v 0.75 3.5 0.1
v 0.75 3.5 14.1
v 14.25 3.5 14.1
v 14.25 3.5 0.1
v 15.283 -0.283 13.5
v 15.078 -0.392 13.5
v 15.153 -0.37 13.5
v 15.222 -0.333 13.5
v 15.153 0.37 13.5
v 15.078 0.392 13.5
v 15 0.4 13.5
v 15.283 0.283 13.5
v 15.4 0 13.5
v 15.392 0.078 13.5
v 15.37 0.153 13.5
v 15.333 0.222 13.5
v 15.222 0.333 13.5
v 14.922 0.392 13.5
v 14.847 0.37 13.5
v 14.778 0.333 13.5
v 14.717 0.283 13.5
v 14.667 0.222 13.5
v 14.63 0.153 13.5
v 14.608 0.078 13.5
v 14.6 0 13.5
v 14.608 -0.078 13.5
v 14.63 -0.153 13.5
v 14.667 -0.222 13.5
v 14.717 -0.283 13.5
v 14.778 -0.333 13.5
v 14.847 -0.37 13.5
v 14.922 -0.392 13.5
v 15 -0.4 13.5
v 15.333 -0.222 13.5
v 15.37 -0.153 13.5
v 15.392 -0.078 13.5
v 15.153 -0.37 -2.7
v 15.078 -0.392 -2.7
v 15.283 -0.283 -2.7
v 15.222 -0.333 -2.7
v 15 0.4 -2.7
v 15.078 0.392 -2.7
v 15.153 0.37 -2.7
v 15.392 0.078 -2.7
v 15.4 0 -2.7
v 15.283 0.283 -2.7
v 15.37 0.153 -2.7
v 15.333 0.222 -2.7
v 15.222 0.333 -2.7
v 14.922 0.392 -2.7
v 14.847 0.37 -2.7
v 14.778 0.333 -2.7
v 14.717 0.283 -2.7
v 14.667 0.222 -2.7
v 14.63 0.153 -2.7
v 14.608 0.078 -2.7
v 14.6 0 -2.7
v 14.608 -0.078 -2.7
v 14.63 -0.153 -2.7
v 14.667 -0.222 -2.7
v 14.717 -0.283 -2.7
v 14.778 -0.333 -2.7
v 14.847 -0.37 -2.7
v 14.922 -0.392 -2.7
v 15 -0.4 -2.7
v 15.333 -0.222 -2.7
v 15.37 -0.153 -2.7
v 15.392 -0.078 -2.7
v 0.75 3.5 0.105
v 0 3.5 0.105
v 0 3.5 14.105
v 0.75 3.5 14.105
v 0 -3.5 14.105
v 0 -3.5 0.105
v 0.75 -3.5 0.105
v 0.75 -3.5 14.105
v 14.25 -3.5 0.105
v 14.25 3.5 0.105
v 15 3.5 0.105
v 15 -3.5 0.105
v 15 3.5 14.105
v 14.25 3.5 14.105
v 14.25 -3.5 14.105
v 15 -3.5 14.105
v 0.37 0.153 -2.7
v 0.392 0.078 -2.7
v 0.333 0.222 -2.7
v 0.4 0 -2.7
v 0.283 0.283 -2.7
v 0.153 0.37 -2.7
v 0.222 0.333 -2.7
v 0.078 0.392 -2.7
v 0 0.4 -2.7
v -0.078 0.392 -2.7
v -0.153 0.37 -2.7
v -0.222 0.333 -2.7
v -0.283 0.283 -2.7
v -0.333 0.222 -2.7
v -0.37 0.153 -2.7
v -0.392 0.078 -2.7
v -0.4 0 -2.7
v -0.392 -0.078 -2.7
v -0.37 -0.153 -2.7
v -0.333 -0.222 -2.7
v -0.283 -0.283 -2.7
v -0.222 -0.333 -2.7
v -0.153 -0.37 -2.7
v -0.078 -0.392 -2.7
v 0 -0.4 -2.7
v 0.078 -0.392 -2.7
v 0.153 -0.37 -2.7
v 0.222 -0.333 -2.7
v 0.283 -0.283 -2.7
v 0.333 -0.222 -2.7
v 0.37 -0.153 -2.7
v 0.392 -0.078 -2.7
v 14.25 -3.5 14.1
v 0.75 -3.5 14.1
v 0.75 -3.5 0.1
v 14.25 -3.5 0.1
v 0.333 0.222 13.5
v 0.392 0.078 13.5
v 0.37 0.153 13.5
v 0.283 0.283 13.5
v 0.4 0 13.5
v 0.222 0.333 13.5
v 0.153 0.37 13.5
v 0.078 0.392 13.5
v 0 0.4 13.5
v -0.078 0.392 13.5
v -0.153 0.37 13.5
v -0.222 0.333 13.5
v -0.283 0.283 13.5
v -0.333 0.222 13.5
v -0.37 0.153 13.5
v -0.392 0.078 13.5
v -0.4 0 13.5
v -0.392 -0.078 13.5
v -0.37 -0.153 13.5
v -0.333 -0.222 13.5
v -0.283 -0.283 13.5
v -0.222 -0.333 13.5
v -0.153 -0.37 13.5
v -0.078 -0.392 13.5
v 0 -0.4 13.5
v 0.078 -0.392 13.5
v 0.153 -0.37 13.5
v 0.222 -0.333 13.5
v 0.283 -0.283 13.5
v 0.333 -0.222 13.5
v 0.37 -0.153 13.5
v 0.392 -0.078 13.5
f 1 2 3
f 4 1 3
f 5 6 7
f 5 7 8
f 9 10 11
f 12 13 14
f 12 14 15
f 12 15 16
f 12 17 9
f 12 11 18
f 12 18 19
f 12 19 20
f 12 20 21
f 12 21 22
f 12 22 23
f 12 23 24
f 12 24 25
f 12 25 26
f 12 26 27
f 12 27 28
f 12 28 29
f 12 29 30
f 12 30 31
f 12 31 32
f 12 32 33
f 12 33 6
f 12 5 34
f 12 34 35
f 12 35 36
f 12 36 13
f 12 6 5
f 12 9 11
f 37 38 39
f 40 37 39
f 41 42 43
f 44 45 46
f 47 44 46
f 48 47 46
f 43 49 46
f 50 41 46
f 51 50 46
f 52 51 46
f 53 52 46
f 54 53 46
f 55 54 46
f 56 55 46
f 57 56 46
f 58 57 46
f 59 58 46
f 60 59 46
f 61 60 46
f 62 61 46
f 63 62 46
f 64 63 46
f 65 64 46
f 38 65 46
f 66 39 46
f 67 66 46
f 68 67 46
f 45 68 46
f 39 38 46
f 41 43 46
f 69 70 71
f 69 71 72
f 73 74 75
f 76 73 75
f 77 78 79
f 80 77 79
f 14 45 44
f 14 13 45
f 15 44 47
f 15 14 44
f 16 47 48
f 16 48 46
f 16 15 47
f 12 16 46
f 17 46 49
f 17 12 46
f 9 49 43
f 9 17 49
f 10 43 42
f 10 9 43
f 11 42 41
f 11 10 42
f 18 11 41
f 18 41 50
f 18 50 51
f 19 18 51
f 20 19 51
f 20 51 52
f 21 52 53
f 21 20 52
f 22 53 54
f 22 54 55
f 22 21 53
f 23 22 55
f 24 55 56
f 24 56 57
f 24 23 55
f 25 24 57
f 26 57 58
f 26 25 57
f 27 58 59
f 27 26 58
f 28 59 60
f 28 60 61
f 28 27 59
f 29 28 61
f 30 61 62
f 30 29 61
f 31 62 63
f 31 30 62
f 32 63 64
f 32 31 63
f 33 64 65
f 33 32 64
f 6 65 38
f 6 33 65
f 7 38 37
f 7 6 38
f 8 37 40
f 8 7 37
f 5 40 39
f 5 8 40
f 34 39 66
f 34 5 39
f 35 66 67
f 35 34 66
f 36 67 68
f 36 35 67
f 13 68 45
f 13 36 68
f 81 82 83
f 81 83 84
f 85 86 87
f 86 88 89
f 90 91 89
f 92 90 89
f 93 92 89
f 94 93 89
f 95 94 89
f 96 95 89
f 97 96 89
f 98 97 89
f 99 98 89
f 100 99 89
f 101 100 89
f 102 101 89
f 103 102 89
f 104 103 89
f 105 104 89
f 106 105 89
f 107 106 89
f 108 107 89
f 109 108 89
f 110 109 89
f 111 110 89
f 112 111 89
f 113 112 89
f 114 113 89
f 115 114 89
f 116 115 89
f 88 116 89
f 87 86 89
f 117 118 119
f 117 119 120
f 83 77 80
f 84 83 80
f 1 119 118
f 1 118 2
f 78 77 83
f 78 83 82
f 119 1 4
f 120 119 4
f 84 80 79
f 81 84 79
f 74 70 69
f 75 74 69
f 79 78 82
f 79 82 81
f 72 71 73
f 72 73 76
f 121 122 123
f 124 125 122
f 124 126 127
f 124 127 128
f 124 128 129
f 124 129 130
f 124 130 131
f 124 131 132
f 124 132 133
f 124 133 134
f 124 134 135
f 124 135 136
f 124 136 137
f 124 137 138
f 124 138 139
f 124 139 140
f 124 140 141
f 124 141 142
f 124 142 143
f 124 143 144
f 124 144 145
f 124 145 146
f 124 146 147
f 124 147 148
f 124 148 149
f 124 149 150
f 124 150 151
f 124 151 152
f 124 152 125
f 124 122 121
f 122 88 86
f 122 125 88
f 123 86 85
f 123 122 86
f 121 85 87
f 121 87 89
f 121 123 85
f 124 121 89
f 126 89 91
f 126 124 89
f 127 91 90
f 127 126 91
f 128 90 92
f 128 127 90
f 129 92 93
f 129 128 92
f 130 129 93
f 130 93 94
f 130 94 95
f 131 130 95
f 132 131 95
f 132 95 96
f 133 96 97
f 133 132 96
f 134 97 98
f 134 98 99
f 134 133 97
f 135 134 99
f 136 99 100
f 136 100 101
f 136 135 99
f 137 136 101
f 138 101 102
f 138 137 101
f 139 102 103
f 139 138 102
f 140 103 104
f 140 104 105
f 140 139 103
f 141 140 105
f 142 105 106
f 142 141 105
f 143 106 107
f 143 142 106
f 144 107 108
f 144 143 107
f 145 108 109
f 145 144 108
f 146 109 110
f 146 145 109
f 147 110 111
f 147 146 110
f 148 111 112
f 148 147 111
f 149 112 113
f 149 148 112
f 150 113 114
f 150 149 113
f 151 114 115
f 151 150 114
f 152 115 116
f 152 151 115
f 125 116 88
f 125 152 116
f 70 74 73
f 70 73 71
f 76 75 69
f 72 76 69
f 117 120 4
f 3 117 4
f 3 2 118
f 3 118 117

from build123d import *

# Parameters (mm, degrees)
SKETCH_W          = 13.5
SKETCH_H          = 7
PAD_DEPTH         = 14
SKETCH001_R       = 0.4
PAD001_DEPTH      = 13
PAD001_DEPTH_BACK = 3.2
SKETCH002_W       = 0.75
SKETCH002_H       = 7
PAD002_DEPTH      = 14


with BuildPart() as pad:
    # Sketch → Pad (new body)
    with BuildSketch(Plane.XY.offset(0.1)):
        with Locations((7.5, 0)):
            Rectangle(SKETCH_W, SKETCH_H)
    extrude(amount=PAD_DEPTH)


with BuildPart() as pad001:
    # Sketch001 → Pad001 (new body, two sides)
    with BuildSketch(Plane.XY.offset(0.5)) as pad001_sk:
        Circle(SKETCH001_R)
        with Locations((15, 0)):
            Circle(SKETCH001_R)
    extrude(amount=PAD001_DEPTH)
    extrude(pad001_sk.sketch, amount=-PAD001_DEPTH_BACK)


with BuildPart() as pad002:
    # Sketch002 → Pad002 (new body)
    with BuildSketch(Plane.XY.offset(0.105)):
        with Locations((0.375, 0)):
            Rectangle(SKETCH002_W, SKETCH002_H)
        with Locations((14.625, 0)):
            Rectangle(SKETCH002_W, SKETCH002_H)
    extrude(amount=PAD002_DEPTH)


solid = Compound([pad.part, pad001.part, pad002.part])
